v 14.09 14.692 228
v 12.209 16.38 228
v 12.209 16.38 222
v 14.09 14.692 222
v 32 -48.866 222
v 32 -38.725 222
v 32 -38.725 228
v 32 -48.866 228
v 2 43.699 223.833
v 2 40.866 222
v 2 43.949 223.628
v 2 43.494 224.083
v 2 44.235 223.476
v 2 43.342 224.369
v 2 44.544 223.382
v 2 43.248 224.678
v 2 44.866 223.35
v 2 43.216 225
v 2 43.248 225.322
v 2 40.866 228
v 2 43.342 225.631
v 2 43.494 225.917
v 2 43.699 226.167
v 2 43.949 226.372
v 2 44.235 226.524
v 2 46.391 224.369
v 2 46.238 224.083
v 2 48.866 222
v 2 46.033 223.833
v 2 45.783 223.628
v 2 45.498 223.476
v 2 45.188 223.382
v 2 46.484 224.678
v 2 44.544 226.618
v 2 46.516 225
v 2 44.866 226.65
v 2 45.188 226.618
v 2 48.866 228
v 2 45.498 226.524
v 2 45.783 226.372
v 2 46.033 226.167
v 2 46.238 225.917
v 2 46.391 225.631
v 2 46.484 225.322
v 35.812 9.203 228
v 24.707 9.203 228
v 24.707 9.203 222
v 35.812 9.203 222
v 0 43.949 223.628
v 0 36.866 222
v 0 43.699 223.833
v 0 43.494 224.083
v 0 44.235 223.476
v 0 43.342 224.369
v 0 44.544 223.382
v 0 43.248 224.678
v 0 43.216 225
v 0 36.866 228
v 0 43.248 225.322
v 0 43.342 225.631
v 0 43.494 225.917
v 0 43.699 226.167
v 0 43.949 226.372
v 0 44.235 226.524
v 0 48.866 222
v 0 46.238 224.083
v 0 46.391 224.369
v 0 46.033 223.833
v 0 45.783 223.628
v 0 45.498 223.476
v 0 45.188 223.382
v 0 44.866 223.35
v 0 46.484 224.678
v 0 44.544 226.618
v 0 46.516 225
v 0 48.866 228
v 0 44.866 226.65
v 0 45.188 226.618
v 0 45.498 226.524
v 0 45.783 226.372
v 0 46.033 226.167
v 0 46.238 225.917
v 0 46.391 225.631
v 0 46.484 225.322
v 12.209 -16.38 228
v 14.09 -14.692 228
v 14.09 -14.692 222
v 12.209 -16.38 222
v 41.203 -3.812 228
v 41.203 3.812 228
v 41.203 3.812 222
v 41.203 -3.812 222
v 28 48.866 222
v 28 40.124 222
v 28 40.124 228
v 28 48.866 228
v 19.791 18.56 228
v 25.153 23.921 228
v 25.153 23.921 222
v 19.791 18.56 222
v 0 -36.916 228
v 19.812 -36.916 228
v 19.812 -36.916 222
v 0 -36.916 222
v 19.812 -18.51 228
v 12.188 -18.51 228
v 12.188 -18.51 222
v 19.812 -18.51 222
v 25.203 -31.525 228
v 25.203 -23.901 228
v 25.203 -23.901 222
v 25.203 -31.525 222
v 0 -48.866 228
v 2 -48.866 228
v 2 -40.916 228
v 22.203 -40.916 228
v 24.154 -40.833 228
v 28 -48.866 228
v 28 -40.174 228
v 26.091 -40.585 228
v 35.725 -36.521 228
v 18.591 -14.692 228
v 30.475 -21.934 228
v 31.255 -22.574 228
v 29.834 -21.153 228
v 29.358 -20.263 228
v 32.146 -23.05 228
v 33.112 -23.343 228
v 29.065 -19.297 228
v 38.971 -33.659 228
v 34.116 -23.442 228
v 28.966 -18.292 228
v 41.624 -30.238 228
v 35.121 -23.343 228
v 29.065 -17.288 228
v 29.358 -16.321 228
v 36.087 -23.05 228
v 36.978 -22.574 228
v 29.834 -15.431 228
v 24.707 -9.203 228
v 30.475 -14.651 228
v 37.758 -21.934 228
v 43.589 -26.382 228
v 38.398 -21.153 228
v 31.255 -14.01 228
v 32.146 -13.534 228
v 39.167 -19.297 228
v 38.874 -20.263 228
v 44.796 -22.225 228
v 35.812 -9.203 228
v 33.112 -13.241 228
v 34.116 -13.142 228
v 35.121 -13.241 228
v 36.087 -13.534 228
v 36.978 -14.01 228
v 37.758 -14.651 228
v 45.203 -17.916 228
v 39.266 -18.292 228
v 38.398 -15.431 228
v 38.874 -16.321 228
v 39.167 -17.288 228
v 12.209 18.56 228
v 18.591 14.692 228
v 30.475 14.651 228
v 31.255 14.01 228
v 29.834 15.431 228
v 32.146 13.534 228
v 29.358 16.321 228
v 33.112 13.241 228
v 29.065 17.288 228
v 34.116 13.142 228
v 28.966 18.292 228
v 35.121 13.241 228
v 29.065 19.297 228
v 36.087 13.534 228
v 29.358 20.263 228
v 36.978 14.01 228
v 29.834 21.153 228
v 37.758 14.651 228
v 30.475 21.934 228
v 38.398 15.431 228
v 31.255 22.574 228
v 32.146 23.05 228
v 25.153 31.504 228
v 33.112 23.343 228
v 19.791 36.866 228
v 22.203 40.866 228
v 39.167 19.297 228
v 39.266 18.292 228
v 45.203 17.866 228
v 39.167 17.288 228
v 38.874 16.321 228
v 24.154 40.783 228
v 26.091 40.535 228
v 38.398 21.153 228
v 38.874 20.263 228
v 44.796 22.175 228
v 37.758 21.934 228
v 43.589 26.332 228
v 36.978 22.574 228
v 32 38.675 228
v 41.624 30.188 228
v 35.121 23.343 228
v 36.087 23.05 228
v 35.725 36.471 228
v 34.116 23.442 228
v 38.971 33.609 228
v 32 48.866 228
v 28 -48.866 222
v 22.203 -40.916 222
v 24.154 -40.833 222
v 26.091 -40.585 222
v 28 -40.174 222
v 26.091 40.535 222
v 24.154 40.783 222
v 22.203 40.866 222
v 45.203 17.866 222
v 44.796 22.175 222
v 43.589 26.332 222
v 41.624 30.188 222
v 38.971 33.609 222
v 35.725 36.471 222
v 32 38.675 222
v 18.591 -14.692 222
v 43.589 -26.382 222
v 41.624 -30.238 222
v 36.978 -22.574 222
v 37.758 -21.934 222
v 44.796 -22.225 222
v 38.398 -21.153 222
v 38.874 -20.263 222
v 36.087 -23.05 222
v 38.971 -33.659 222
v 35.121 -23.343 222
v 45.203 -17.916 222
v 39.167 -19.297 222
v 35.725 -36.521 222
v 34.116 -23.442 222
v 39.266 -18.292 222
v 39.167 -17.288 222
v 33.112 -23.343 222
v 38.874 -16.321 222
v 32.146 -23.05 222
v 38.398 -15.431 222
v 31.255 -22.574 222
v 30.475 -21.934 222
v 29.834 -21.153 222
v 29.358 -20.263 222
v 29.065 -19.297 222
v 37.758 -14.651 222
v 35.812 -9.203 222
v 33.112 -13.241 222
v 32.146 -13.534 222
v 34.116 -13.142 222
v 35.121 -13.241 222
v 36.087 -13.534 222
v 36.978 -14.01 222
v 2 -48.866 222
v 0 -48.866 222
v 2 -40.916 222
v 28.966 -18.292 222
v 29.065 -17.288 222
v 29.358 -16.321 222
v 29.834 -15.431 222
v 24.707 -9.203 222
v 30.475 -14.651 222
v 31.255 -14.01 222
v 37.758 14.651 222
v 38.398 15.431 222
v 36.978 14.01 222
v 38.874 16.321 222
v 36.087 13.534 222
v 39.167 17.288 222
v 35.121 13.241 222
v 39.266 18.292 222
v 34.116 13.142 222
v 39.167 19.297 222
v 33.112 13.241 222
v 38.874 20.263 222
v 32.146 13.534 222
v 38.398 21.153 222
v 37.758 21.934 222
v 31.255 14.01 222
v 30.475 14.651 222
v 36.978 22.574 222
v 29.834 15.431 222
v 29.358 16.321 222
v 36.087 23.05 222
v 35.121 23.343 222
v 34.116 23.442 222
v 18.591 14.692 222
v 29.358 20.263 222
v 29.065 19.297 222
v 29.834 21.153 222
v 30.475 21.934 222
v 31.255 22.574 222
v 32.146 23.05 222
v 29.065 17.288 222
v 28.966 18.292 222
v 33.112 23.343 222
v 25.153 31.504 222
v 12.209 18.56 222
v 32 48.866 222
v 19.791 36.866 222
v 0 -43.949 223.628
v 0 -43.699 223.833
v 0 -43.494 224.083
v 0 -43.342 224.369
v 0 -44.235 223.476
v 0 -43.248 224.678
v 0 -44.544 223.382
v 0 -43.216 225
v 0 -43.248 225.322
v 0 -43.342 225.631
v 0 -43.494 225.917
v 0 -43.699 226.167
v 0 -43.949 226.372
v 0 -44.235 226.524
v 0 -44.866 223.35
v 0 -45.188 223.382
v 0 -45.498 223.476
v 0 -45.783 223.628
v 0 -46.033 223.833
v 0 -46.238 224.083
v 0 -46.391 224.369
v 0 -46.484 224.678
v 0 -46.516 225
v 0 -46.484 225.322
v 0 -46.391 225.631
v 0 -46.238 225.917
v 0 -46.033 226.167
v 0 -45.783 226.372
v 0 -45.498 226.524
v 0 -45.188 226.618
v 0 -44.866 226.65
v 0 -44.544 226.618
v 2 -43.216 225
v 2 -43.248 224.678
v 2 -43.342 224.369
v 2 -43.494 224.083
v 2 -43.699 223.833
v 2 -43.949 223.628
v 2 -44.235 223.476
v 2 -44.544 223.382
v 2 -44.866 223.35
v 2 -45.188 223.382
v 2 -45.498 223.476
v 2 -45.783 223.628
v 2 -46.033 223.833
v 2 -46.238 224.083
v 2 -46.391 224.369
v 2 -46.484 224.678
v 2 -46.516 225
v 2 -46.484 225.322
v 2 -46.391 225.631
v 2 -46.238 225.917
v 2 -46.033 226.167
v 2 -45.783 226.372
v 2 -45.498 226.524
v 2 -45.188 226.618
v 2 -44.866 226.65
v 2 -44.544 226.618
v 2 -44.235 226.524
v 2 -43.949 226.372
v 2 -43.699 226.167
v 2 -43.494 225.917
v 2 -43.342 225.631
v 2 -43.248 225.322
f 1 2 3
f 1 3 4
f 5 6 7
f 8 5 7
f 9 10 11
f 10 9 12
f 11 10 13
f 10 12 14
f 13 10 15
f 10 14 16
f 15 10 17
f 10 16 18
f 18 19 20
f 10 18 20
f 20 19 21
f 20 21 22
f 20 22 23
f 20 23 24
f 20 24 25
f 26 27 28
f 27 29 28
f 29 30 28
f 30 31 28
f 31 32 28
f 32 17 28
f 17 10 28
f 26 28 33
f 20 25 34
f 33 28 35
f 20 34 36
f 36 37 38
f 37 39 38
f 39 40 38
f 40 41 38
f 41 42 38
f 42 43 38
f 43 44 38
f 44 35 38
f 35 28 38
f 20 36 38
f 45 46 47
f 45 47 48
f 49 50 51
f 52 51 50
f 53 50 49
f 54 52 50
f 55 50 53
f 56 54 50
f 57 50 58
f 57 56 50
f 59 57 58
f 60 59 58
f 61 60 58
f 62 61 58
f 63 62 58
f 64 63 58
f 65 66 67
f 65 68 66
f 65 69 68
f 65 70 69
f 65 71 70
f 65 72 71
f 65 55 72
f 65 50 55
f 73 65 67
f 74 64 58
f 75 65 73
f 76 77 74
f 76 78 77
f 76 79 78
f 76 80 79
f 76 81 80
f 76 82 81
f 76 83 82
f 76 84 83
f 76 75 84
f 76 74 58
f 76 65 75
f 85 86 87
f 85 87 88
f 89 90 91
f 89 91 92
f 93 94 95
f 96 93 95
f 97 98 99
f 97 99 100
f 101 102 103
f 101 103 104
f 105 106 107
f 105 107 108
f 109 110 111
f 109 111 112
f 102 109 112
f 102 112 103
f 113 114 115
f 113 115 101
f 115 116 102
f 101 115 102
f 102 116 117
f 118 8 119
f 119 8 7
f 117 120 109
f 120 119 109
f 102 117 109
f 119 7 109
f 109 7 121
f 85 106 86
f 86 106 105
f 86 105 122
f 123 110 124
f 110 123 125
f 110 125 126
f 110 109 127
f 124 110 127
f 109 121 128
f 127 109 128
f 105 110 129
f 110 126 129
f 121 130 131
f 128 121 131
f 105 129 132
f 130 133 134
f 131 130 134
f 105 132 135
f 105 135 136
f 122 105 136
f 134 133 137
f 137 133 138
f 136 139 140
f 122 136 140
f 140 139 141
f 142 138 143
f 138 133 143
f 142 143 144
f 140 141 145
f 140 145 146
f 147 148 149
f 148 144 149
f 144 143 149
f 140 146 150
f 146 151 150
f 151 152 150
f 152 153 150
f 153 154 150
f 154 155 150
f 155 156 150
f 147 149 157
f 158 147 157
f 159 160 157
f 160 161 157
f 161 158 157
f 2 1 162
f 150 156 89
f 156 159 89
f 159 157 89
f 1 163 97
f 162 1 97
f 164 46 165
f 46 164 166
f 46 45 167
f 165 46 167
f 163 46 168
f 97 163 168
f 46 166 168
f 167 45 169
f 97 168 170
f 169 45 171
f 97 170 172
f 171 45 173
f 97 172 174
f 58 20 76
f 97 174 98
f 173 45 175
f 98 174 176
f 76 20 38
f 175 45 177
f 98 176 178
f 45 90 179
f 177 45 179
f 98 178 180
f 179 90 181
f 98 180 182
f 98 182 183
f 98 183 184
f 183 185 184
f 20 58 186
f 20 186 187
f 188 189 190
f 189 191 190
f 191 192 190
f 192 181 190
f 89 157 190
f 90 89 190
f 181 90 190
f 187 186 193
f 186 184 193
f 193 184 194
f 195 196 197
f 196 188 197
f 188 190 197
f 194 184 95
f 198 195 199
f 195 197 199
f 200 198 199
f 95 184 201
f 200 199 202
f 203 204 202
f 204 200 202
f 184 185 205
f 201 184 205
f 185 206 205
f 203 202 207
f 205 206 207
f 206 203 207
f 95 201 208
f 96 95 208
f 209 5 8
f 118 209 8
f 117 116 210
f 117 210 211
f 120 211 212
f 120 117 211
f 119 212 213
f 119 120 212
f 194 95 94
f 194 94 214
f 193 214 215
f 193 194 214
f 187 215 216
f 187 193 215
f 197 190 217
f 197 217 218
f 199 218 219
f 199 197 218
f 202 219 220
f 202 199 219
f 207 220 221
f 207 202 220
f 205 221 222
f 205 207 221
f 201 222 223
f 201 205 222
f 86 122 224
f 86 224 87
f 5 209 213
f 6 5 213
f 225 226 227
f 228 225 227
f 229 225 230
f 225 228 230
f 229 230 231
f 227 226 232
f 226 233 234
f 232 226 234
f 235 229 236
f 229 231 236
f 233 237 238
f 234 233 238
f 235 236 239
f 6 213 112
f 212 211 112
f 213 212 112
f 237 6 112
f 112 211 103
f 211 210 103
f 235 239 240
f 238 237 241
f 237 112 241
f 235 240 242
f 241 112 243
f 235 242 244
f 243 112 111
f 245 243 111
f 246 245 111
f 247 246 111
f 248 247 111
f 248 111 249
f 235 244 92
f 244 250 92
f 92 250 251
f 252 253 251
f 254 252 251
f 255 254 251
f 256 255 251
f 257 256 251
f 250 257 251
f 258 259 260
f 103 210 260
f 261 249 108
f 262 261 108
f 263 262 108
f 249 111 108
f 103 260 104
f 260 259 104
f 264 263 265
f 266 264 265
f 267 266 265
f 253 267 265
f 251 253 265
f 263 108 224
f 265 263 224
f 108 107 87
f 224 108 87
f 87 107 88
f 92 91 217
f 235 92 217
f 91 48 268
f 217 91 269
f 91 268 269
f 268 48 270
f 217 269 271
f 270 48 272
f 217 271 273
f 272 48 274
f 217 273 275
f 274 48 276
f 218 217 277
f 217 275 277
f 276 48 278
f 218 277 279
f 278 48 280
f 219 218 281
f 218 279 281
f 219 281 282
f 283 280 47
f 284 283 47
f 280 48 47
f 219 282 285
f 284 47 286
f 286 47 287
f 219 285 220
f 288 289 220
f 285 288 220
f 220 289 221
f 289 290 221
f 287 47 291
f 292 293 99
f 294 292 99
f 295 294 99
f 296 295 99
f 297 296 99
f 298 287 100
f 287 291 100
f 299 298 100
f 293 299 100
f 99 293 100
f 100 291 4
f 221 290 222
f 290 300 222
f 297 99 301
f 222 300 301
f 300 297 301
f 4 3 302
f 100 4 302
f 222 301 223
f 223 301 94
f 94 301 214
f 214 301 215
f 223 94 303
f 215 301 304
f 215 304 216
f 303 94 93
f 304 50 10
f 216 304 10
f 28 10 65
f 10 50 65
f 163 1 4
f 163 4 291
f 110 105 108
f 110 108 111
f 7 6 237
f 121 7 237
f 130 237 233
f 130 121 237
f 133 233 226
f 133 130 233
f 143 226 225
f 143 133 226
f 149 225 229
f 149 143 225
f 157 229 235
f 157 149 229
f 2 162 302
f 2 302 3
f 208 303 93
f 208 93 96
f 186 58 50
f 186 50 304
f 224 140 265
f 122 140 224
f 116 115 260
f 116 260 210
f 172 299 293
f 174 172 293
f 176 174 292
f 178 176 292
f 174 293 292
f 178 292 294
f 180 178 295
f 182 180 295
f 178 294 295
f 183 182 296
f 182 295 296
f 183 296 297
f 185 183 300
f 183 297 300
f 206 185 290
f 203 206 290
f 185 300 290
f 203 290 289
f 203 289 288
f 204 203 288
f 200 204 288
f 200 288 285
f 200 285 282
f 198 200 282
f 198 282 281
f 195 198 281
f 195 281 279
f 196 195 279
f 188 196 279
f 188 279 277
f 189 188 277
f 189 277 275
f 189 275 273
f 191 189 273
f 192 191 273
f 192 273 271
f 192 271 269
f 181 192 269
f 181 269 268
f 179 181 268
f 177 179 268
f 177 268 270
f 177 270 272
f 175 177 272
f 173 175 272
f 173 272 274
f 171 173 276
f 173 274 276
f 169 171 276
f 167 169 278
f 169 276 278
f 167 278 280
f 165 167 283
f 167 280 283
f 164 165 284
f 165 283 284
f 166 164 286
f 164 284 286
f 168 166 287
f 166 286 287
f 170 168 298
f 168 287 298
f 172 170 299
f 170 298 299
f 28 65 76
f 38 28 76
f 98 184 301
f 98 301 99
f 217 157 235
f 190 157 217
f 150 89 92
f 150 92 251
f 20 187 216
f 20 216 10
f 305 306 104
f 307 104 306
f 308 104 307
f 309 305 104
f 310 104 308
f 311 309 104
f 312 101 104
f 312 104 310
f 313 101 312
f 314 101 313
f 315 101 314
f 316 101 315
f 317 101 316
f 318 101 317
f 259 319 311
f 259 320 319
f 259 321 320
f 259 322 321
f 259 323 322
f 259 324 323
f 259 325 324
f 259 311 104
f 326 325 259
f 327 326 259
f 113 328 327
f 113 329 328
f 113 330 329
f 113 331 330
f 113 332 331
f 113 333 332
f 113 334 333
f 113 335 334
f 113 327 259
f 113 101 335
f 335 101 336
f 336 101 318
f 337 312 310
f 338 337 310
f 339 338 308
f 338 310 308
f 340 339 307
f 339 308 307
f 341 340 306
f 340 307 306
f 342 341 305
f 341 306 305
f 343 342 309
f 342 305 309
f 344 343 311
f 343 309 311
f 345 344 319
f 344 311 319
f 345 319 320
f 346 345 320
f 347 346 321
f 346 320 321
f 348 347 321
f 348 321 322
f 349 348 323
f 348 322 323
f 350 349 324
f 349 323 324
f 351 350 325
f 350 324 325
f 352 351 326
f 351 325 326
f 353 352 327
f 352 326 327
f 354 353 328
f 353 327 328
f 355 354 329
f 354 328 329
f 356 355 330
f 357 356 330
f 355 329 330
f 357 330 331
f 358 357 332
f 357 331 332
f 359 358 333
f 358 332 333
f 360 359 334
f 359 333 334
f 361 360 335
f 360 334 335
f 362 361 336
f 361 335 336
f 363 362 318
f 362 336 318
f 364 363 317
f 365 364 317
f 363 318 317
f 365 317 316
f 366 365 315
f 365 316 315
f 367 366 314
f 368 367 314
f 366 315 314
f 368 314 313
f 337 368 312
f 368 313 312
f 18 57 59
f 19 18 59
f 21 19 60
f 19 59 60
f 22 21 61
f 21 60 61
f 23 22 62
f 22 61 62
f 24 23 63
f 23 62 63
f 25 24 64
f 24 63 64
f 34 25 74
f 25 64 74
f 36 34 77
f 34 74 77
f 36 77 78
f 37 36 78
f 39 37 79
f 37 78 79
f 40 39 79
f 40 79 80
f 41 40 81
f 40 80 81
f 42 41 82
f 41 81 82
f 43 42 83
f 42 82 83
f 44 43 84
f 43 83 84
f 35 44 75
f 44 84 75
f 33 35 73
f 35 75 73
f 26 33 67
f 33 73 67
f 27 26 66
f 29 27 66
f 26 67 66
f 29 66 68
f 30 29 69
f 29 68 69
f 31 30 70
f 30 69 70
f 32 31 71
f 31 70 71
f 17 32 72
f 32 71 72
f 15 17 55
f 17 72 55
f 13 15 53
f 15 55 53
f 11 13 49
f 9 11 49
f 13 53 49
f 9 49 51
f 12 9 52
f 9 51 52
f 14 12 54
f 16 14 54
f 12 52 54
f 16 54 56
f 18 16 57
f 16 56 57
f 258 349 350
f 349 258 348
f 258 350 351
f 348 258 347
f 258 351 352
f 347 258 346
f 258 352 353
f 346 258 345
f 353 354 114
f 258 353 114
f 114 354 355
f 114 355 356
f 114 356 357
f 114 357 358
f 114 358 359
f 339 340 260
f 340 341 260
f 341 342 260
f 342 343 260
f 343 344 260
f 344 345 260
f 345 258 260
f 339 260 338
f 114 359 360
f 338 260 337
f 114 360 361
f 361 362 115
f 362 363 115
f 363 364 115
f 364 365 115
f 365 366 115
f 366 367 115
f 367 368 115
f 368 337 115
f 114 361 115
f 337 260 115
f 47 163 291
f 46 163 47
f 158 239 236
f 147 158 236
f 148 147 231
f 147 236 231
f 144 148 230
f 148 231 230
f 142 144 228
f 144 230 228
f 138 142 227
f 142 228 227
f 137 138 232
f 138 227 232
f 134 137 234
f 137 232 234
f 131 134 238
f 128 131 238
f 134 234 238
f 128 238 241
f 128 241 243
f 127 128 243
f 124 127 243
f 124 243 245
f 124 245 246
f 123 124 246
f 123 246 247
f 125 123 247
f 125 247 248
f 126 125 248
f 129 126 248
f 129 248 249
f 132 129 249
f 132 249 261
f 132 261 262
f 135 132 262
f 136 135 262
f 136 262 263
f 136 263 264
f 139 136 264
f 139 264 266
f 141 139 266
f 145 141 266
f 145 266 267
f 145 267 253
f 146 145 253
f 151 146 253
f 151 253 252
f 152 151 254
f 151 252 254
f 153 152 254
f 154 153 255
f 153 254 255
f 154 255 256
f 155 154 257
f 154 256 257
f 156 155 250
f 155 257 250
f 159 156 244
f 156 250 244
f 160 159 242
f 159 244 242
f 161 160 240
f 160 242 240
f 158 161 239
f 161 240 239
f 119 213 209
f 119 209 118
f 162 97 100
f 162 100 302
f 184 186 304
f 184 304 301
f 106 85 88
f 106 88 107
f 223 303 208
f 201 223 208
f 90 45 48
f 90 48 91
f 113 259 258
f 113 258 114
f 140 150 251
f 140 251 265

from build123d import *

# Parameters (mm, degrees)
EXTRUDE_1_DEPTH     = 6
SKETCH_2_W          = 6
SKETCH_2_H          = 8
SKETCH_2_R          = 1.65
EXTRUDE_2_DEPTH     = 2
EXTRUDE_START       = -32
SKETCH_3_W          = 6
SKETCH_3_H          = 12
EXTRUDE_3_DEPTH     = 4
CUT_EXTRUDE_1_REACH = 68.837
SKETCH_4_R          = 5.15


with BuildPart() as part:
    # 草图1 → 凸台-拉伸1 (new body)
    with BuildSketch(Plane.XY.offset(228)):
        with BuildLine():
            Line((25.153300859, 23.921391565), (19.791421356, 18.559512062))
            Line((19.791421356, 18.559512062), (12.208578644, 18.559512062))
            Line((12.208578644, 18.559512062), (12.208578644, 16.380432911))
            Line((12.208578644, 16.380432911), (14.08992832, 14.6918887))
            Line((14.08992832, 14.6918887), (18.591338638, 14.6918887))
            Line((18.591338638, 14.6918887), (24.706637775, 9.203300859))
            Line((24.706637775, 9.203300859), (28.187867966, 9.203300859))
            Line((28.187867966, 9.203300859), (35.812132034, 9.203300859))
            Line((35.812132034, 9.203300859), (41.203300859, 3.812132034))
            Line((41.203300859, 3.812132034), (41.203300859, -3.812132034))
            Line((41.203300859, -3.812132034), (35.812132034, -9.203300859))
            Line((35.812132034, -9.203300859), (28.187867966, -9.203300859))
            Line((28.187867966, -9.203300859), (24.706637775, -9.203300859))
            Line((24.706637775, -9.203300859), (18.591338638, -14.6918887))
            Line((18.591338638, -14.6918887), (14.08992832, -14.6918887))
            Line((14.08992832, -14.6918887), (12.208578644, -16.380432911))
            Line((12.208578644, -16.380432911), (12.187867966, -18.509512062))
            Line((12.187867966, -18.509512062), (19.812132034, -18.509512062))
            Line((19.812132034, -18.509512062), (25.203300859, -23.900680887))
            Line((25.203300859, -23.900680887), (25.203300859, -31.524944955))
            Line((25.203300859, -31.524944955), (19.812132034, -36.91611378))
            Line((19.812132034, -36.91611378), (12.187867966, -36.91611378))
            Line((12.187867966, -36.91611378), (0, -36.91611378))
            Line((0, -36.91611378), (0, -40.91611378))
            Line((0, -40.91611378), (22.203300859, -40.91611378))
            ThreePointArc((22.203300859, -40.91611378), (38.466756826, -34.179569747), (45.203300859, -17.91611378))
            Line((45.203300859, -17.91611378), (45.203300859, 17.86611378))
            ThreePointArc((45.203300859, 17.86611378), (38.466756826, 34.129569747), (22.203300859, 40.86611378))
            Line((22.203300859, 40.86611378), (0, 40.86611378))
            Line((0, 40.86611378), (0, 36.86611378))
            Line((0, 36.86611378), (12.208578644, 36.86611378))
            Line((12.208578644, 36.86611378), (19.791421356, 36.86611378))
            Line((19.791421356, 36.86611378), (25.153300859, 31.504234277))
            Line((25.153300859, 31.504234277), (25.153300859, 23.921391565))
        make_face()
    extrude(amount=-EXTRUDE_1_DEPTH)

    # 草图2 → 凸台-拉伸2 (add)
    # profile 1 of 2: a face of its own
    with BuildSketch(Plane.ZY):
        with Locations((225, 44.86611378)):
            Rectangle(SKETCH_2_W, SKETCH_2_H)
        with Locations(Location((225, 44.86611378, 0), (0, 0, 270))):
            Circle(SKETCH_2_R, mode=Mode.SUBTRACT)
    # profile 2 of 2: a face of its own
    with BuildSketch(Plane.ZY):
        with Locations((225, -44.86611378)):
            Rectangle(SKETCH_2_W, SKETCH_2_H)
        with Locations(Location((225, -44.86611378, 0), (0, 0, 90))):
            Circle(SKETCH_2_R, mode=Mode.SUBTRACT)
    extrude(amount=-EXTRUDE_2_DEPTH)

    # 草图3 → 凸台-拉伸3 (add)
    with BuildSketch(Plane.ZY.offset(EXTRUDE_START)):
        with Locations((225, 42.86611378)):
            Rectangle(SKETCH_3_W, SKETCH_3_H)
        with Locations((225, -42.86611378)):
            Rectangle(SKETCH_3_W, SKETCH_3_H)
    extrude(amount=EXTRUDE_3_DEPTH)

    # 草图4 → 切除-拉伸1 (cut, up to next)
    with BuildSketch(Plane(origin=(0, 0, 222), x_dir=(-1, 0, 0), z_dir=(0, 0, -1)), mode=Mode.PRIVATE) as cut_extrude_1_sk1:
        with Locations((-34.116390274, 18.292236363)):
            Circle(SKETCH_4_R)
    cut_extrude_1_tool1 = extrude(cut_extrude_1_sk1.sketch, amount=-CUT_EXTRUDE_1_REACH, mode=Mode.PRIVATE) & part.part
    # 草图4 → 切除-拉伸1 (cut, up to next)
    with BuildSketch(Plane(origin=(0, 0, 222), x_dir=(-1, 0, 0), z_dir=(0, 0, -1)), mode=Mode.PRIVATE) as cut_extrude_1_sk2:
        with Locations(Location((-34.116390274, -18.292236363, 0), (0, 0, 180))):
            Circle(SKETCH_4_R)
    cut_extrude_1_tool2 = extrude(cut_extrude_1_sk2.sketch, amount=-CUT_EXTRUDE_1_REACH, mode=Mode.PRIVATE) & part.part
    add(cut_extrude_1_tool1.solids().sort_by_distance((34.11639, 18.292236, 222))[0], mode=Mode.SUBTRACT)
    add(cut_extrude_1_tool2.solids().sort_by_distance((34.11639, -18.292236, 222))[0], mode=Mode.SUBTRACT)


solid = part.part
